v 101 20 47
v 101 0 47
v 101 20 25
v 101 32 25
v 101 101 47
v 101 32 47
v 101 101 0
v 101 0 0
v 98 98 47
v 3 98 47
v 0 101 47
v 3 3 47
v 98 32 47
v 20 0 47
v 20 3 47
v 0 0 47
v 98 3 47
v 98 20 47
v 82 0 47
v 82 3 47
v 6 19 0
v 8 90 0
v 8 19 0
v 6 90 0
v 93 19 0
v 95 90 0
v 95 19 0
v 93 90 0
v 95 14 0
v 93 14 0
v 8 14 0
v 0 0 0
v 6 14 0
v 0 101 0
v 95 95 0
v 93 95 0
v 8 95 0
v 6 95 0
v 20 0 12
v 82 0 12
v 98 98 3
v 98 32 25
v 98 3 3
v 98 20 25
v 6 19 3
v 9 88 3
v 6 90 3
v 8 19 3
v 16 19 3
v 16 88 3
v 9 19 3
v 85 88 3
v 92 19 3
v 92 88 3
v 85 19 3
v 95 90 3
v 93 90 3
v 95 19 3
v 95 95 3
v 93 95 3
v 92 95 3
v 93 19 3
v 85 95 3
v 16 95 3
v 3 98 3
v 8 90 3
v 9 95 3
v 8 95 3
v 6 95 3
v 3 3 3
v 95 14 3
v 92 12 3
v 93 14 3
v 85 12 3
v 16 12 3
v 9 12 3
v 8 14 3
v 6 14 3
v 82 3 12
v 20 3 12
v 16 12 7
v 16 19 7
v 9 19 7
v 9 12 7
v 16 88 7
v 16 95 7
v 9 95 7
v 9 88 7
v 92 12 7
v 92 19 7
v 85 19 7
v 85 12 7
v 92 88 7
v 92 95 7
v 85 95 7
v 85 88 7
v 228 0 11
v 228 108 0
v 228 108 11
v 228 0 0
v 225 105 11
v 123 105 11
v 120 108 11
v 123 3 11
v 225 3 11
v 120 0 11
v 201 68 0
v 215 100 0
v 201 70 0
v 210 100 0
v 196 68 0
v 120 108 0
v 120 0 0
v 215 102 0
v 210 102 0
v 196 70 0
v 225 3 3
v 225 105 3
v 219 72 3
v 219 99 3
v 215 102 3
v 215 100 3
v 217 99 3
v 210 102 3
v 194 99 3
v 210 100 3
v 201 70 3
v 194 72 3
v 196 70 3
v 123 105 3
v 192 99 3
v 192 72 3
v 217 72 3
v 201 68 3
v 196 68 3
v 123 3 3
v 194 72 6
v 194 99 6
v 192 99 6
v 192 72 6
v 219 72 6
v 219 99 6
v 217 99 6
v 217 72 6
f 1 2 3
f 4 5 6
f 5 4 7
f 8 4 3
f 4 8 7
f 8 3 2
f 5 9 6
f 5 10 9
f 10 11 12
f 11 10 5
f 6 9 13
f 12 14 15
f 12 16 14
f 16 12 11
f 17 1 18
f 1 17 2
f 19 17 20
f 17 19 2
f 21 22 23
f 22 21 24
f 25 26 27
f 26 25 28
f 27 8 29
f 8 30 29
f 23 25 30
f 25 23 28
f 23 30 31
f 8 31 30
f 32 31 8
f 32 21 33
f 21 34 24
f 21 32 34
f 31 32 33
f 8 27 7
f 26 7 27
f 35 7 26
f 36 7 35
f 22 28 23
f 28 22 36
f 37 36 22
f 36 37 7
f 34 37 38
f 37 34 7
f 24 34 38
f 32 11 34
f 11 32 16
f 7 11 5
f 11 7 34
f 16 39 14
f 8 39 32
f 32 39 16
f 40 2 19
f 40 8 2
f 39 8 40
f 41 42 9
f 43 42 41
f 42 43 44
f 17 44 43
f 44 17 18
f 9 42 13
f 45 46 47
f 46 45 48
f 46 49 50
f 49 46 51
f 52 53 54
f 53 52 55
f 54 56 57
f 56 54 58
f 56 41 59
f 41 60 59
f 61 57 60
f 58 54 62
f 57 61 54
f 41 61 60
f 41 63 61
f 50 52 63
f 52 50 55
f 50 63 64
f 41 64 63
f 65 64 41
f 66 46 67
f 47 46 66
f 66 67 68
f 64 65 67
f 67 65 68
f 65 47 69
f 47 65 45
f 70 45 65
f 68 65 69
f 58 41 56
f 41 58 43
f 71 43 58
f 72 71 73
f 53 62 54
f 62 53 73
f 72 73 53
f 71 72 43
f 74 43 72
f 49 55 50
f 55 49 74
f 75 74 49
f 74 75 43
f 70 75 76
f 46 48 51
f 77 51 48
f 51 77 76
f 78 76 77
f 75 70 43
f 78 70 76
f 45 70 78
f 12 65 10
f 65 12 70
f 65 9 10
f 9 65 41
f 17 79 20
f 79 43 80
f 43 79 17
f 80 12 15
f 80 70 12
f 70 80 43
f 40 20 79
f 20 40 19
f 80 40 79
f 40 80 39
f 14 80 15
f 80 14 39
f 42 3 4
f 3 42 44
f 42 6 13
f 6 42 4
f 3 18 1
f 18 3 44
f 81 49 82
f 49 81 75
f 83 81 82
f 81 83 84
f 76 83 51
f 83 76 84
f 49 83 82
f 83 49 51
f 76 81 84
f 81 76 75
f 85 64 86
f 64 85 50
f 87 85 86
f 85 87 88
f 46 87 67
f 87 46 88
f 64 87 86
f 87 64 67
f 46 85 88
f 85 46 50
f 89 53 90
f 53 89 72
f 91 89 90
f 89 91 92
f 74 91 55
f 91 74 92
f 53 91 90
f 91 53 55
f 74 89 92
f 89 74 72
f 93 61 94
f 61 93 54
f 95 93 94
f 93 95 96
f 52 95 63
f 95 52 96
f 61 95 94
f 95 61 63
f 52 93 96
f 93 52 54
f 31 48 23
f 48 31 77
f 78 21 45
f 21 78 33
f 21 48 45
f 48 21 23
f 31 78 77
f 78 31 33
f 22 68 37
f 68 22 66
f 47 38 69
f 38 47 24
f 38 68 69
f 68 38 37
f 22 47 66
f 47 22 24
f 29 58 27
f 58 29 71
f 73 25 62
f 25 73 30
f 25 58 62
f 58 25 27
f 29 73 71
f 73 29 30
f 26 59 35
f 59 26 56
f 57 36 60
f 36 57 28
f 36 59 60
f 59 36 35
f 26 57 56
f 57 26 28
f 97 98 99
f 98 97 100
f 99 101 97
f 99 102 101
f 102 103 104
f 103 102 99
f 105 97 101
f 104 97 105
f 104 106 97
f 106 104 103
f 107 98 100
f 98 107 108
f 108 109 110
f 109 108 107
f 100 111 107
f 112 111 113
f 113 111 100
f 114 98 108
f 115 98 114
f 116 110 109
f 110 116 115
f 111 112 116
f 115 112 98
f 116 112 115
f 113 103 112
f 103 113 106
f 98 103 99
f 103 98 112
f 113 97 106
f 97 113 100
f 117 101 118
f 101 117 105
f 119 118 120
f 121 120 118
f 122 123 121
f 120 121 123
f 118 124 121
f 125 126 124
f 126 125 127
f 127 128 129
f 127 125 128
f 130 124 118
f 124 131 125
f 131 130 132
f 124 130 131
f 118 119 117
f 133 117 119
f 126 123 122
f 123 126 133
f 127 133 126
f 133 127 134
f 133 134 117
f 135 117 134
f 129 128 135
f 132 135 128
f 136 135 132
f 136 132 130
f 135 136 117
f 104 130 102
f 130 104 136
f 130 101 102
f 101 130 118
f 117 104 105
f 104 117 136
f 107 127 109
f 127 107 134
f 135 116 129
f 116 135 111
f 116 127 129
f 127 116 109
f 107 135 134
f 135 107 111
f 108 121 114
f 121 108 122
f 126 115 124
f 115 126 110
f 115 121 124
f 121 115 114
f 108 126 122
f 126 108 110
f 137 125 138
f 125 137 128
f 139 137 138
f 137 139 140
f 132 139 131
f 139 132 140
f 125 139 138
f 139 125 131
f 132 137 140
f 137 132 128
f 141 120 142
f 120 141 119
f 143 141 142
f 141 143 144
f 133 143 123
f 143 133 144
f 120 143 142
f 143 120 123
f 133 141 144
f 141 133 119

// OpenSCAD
// Units mm. Prototype: board 83x83, Overall assembled enclosure 108x108x50. Internal board clearance 40.
// part: base, lid or layout. Lid prints exterior face down.
part="layout";
module base(){difference(){union(){difference(){translate([0,0,0]) cube([101,101,47]);translate([3,3,3]) cube([95,95,45]);translate([20,-1,12]) cube([62,5,36]);translate([97,20,25]) cube([5,12,23]);}translate([9,12,3]) cube([7,7,4]);translate([9,88,3]) cube([7,7,4]);translate([85,12,3]) cube([7,7,4]);translate([85,88,3]) cube([7,7,4]);}translate([6,14,-1]) cube([2,5,5]);translate([6,90,-1]) cube([2,5,5]);translate([93,14,-1]) cube([2,5,5]);translate([93,90,-1]) cube([2,5,5]);}}
module lid(){difference(){translate([0,0,0]) cube([108,108,11]);translate([3,3,3]) cube([102,102,9]);translate([76,68,-1]) cube([5,2,5]);translate([90,100,-1]) cube([5,2,5]);}}
module lid_complete(){union(){lid();translate([72,72,3]) cube([2,27,3]);translate([97,72,3]) cube([2,27,3]);}}
if(part=="base") base(); else if(part=="lid") lid_complete(); else {base(); translate([120,0,0]) lid_complete();}
